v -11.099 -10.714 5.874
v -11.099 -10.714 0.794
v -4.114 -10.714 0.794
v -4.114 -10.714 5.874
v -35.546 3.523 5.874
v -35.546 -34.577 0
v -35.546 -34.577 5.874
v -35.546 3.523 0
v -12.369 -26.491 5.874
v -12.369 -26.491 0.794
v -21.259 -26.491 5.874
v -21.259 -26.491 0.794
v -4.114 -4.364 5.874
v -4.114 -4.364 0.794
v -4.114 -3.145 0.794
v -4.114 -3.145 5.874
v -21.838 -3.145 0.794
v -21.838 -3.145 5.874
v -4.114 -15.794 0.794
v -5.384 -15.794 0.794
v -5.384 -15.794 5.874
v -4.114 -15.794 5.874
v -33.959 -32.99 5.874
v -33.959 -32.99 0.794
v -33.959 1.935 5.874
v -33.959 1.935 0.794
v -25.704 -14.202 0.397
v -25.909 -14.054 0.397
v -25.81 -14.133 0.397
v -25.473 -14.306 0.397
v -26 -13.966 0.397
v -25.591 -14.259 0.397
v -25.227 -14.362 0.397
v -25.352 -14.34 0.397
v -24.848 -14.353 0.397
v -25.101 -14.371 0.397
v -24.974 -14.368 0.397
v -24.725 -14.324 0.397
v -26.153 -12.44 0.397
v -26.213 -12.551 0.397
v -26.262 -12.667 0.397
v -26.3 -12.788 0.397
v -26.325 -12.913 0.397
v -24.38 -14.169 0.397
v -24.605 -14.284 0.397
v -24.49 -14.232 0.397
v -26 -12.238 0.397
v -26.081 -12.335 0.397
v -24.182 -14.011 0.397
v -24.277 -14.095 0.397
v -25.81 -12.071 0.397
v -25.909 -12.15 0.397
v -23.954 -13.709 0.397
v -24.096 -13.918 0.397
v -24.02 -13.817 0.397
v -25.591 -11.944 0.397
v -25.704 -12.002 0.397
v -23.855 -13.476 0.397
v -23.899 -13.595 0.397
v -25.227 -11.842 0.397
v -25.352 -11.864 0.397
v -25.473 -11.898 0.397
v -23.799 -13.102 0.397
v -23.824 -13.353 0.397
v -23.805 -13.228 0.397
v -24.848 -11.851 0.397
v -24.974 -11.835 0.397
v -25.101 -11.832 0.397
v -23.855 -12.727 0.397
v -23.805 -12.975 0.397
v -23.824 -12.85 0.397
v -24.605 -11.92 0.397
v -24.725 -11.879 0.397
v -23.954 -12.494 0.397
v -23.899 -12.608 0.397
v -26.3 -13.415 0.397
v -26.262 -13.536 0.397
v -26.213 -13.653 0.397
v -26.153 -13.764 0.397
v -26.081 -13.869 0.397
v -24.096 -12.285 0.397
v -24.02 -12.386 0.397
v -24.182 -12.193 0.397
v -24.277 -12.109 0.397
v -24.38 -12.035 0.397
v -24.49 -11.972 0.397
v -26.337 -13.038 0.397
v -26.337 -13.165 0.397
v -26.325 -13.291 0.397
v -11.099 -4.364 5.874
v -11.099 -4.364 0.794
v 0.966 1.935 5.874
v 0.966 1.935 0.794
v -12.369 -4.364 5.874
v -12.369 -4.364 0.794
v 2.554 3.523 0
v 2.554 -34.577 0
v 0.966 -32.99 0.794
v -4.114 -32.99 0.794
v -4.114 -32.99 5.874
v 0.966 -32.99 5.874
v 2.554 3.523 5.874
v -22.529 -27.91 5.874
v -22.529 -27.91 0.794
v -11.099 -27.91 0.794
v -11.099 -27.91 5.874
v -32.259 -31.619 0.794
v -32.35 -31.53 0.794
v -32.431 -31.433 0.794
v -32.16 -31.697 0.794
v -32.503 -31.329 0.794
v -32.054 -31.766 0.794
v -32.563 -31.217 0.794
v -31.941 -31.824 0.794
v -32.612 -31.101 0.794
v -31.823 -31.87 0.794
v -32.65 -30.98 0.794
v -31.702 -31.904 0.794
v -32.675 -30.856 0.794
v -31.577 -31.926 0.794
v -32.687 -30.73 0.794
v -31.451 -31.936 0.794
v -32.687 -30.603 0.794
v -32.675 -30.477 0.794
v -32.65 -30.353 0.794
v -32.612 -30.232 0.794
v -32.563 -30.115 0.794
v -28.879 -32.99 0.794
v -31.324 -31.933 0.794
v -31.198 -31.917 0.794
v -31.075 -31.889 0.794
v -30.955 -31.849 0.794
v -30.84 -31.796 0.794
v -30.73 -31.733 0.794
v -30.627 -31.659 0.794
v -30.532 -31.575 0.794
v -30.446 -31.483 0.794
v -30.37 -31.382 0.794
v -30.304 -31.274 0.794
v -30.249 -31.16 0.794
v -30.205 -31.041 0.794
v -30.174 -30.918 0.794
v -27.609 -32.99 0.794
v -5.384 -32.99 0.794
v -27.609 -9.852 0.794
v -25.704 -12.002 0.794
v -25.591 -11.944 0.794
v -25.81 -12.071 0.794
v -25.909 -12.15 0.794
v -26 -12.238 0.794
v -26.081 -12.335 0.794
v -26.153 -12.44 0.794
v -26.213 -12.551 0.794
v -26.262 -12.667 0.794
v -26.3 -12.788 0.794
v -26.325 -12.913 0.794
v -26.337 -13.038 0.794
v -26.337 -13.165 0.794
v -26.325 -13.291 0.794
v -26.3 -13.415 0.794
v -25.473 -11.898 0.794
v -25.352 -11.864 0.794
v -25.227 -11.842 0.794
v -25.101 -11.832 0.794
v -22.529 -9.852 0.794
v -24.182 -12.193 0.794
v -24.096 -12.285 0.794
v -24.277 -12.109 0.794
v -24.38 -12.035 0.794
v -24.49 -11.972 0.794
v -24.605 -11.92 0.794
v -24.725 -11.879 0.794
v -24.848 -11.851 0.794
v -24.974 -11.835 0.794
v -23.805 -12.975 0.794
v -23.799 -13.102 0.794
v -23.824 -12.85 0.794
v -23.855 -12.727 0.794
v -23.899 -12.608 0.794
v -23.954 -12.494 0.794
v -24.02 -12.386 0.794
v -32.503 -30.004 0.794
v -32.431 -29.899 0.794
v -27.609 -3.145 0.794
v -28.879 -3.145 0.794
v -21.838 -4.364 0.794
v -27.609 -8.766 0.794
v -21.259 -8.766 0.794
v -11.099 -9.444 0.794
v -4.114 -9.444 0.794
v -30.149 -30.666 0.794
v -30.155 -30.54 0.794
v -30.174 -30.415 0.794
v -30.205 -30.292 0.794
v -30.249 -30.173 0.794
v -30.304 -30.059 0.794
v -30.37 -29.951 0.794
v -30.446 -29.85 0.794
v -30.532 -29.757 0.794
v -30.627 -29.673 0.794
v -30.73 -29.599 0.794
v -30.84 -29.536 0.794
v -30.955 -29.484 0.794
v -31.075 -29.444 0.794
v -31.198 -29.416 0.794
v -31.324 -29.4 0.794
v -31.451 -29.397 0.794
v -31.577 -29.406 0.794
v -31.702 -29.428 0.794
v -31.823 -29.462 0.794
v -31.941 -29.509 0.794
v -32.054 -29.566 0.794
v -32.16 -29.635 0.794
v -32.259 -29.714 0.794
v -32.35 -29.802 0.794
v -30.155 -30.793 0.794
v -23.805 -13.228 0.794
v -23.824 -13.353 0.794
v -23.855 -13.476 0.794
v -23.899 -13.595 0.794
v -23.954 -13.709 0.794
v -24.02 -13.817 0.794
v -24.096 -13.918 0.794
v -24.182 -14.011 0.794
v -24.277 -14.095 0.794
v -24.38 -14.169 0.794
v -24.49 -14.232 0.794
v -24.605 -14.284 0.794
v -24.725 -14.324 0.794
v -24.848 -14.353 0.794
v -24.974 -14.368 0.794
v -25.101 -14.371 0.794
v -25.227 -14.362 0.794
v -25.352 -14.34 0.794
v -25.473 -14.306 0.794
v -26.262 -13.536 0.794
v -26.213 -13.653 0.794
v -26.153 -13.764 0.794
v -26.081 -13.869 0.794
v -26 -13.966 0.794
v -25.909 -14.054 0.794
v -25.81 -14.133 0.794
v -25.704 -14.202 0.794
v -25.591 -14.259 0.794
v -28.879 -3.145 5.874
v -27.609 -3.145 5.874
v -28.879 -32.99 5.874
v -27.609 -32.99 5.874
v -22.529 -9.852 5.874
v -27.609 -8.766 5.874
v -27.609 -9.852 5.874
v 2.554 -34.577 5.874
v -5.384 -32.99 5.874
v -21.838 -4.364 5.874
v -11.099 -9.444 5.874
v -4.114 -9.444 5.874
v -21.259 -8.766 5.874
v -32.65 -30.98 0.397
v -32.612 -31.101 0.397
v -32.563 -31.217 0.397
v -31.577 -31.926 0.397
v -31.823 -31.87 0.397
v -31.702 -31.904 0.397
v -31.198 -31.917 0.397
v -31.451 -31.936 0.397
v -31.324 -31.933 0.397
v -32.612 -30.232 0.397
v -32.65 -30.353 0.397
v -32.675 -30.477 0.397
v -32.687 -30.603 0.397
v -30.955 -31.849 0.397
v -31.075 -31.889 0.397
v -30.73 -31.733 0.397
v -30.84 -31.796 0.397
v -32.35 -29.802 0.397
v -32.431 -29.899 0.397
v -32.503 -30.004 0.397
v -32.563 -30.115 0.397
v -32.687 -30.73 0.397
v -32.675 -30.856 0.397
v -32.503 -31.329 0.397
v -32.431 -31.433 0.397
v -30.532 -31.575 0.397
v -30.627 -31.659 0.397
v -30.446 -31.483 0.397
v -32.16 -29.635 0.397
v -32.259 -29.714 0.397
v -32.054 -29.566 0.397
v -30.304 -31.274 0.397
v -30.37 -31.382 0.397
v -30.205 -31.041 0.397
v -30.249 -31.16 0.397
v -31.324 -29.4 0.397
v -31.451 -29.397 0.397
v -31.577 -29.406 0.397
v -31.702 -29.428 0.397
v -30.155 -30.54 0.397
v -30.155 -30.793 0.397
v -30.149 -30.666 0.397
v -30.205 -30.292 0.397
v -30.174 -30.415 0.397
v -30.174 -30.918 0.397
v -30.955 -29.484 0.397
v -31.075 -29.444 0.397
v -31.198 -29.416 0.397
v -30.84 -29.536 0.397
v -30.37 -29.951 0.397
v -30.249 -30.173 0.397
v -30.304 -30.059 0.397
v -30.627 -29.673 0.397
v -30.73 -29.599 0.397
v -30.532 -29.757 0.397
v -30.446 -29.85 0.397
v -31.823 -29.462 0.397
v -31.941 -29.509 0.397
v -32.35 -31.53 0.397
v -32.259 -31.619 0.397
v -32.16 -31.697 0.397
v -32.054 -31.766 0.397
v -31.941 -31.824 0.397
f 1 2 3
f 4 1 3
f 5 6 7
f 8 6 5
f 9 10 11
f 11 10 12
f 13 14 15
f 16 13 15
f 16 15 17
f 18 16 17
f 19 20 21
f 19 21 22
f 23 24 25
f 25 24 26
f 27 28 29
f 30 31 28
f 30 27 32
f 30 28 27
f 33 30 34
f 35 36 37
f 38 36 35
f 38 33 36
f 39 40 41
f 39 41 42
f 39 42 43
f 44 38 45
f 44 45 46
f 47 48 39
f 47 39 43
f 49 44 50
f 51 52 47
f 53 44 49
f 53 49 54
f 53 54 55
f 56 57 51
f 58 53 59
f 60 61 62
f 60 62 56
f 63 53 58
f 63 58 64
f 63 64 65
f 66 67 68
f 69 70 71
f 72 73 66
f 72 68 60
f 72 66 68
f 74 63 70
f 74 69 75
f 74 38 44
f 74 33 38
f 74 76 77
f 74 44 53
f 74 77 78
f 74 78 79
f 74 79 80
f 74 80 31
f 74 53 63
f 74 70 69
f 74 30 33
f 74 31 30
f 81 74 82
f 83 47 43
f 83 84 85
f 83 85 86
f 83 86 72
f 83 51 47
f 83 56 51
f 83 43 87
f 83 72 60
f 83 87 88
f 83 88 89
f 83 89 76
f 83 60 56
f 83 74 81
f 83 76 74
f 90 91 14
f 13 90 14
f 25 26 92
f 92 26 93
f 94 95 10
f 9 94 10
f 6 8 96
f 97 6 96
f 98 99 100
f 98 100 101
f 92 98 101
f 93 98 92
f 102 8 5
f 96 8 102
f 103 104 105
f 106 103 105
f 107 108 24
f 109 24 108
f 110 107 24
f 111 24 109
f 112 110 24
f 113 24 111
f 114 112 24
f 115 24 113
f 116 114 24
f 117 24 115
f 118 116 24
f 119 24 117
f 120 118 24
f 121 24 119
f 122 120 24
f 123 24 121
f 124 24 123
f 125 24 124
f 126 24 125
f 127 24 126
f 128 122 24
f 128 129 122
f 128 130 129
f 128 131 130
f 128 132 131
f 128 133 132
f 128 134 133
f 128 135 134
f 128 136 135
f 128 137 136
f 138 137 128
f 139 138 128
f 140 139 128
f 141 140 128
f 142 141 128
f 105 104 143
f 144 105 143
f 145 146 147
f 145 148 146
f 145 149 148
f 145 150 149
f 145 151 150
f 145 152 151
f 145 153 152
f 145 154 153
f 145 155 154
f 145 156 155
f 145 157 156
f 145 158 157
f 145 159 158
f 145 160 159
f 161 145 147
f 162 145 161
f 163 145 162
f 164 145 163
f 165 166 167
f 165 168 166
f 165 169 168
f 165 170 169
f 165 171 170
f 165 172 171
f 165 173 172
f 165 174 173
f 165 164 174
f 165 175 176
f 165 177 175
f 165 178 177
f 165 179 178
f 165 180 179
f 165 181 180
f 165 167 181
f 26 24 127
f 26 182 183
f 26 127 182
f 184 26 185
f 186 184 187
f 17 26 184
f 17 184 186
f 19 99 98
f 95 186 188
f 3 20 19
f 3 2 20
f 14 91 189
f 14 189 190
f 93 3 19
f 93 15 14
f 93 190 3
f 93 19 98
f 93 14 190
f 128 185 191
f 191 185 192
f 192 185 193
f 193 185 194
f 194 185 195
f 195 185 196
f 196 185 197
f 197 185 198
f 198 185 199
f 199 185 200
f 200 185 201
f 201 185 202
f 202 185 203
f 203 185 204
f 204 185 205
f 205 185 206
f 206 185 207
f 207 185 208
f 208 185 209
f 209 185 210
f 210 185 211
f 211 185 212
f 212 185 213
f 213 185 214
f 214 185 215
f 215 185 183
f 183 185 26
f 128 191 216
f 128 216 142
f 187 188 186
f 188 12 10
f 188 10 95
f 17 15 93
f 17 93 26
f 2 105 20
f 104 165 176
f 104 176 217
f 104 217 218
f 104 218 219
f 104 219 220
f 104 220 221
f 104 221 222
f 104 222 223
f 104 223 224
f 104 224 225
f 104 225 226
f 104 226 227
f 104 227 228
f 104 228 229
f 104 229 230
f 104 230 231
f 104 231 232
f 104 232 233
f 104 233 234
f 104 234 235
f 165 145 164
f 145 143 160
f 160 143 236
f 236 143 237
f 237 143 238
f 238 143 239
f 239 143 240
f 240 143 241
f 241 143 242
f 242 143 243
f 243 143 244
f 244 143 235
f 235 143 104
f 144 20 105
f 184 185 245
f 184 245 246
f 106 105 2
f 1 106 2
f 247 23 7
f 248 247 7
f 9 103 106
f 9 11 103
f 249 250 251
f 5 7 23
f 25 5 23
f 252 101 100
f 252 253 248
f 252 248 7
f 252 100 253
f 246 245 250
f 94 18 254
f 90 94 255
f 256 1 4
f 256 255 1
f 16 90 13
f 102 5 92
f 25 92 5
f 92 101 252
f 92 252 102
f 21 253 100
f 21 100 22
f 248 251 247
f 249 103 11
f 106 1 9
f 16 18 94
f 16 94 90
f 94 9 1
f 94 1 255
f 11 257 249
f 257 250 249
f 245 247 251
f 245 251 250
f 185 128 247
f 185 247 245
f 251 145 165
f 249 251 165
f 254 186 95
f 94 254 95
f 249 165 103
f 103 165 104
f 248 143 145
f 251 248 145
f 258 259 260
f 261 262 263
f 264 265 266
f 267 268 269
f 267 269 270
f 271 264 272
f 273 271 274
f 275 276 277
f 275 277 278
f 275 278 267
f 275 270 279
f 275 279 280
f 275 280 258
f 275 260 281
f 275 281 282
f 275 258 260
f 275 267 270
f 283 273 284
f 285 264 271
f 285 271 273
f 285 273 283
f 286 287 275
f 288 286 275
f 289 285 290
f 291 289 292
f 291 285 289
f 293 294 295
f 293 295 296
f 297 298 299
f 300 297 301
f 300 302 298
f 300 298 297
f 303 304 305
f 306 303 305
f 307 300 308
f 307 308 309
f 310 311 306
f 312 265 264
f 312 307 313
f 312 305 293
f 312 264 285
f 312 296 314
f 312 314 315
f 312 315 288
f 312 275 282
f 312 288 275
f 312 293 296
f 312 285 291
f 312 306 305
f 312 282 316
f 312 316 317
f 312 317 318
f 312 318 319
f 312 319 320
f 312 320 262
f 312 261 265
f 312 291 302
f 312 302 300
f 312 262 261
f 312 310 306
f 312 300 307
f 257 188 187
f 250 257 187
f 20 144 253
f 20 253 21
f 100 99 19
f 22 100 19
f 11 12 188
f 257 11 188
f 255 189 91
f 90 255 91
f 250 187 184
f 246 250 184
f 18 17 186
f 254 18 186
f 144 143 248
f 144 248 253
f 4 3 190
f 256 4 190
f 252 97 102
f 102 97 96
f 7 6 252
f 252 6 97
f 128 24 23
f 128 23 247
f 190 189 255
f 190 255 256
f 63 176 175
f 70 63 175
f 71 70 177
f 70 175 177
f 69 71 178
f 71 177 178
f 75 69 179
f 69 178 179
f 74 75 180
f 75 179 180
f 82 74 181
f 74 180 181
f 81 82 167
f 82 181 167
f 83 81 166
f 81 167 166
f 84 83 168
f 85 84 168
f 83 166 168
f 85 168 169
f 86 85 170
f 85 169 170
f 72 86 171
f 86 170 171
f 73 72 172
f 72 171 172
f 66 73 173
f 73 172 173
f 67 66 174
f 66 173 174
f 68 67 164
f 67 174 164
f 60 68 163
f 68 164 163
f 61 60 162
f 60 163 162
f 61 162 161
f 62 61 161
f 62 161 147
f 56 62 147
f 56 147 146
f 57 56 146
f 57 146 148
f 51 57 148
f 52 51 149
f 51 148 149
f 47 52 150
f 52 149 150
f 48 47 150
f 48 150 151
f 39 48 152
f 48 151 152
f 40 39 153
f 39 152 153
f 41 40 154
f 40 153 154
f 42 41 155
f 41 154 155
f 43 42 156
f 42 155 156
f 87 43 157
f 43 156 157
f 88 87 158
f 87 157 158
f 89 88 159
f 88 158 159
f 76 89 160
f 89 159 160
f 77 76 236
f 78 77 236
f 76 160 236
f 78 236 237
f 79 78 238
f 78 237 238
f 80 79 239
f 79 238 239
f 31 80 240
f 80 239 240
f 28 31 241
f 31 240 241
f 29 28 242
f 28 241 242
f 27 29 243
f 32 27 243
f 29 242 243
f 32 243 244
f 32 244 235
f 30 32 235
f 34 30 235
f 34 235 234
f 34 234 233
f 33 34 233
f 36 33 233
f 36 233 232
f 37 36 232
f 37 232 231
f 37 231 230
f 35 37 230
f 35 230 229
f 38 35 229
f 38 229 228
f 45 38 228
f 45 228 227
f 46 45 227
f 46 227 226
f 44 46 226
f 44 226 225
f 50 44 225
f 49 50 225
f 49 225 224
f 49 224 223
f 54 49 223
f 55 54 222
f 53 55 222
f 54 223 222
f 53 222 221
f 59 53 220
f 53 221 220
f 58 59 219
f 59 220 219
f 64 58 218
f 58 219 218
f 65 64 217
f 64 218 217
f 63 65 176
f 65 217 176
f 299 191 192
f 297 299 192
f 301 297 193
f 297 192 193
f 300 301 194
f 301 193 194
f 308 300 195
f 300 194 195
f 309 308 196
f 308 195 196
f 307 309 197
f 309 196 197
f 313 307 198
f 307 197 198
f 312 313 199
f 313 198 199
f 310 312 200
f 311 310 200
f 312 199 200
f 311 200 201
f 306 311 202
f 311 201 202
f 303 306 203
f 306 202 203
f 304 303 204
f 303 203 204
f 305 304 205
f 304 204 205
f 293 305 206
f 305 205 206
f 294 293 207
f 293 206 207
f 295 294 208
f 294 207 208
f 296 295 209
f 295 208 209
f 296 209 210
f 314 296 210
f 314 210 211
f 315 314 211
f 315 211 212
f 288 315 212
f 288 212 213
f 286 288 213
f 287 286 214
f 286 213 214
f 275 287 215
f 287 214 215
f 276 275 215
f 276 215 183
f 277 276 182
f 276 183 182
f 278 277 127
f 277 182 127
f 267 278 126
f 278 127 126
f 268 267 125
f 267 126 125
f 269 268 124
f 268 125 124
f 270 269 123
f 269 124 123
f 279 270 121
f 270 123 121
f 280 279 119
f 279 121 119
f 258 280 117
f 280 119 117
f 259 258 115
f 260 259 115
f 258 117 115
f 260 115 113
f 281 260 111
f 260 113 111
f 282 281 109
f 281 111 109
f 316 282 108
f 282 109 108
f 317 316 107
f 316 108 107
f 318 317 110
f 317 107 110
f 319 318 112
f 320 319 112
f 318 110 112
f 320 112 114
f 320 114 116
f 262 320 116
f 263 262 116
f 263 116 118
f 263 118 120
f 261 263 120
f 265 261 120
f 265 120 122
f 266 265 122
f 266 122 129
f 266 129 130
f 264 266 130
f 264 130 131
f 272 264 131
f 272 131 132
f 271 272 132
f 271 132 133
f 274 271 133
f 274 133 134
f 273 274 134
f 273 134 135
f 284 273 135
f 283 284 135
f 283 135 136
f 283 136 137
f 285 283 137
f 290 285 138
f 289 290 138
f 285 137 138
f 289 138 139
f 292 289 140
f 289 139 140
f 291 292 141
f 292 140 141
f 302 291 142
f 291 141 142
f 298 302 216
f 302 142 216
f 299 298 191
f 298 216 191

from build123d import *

# Parameters (mm, degrees)
F0_W      = 38.1
F0_H      = 38.1
F1_DEPTH  = 0.79375
F2_W      = 38.1
F2_H      = 38.1
F2_W_2    = 34.925
F2_H_2    = 34.925
F3_DEPTH  = 5.08
F4_W      = 1.27
F4_H      = 29.845
F5_DEPTH  = 5.08
F6_R      = 1.27
F7_DEPTH  = 0.396875
F9_DEPTH  = 5.08
F8_W      = 1.27
F8_H      = 17.1959060269
F10_DEPTH = 5.08
F8_R      = 1.27
F11_DEPTH = 0.396875
F8_W_2    = 6.985
F8_H_2    = 1.27
F12_DEPTH = 5.08


# Not quite as in the source:
# - a feature names something its author has since deleted; it is built from what else it names


with BuildPart() as f1:
    # F0 (on Top) → F1 (new body)
    with BuildSketch(Plane.XY):
        with Locations((-16.4964904517, -15.5271535208)):
            Rectangle(F0_W, F0_H)
    extrude(amount=F1_DEPTH)

    # F2 (on face) → F3 (join)
    with BuildSketch(Plane.XY.offset(0.79375)):
        with Locations((-16.4964904517, -15.5271535208)):
            Rectangle(F2_W, F2_H)
        with Locations((-16.4964904517, -15.5271535208)):
            Rectangle(F2_W_2, F2_H_2, mode=Mode.SUBTRACT)
    extrude(amount=F3_DEPTH)

    # F4 (on face) → F5 (join)
    with BuildSketch(Plane.XY.offset(0.79375)):
        with Locations((-28.2439904517, -18.0671535208)):
            Rectangle(F4_W, F4_H)
    extrude(amount=F5_DEPTH)

    # F6 (on face) → F7 (cut)
    with BuildSketch(Plane.XY.offset(0.79375)):
        with Locations((-31.4189904517, -30.6663066149)):
            Circle(F6_R)
    extrude(amount=-F7_DEPTH, mode=Mode.SUBTRACT)

    # F8 (on face) → F9 (join)
    with BuildSketch(Plane.XY.offset(0.79375)):
        Polygon((-4.1139904517, -3.1446535208), (-21.8377289305, -3.1446535208), (-21.8377289305, -4.3637474939), (-12.3689904517, -4.3637474939), (-12.3689904517, -26.4913998544), (-21.2589904517, -26.4913998544), (-21.2589904517, -8.7657477707), (-22.5289904517, -8.7657477707), (-27.6089904517, -8.7657477707), (-27.6089904517, -9.8523776978), (-22.5289904517, -9.8523776978), (-22.5289904517, -27.9096535208), (-11.0989904517, -27.9096535208), (-11.0989904517, -10.7137474939), (-11.0989904517, -9.4437474939), (-11.0989904517, -4.3637474939), (-4.1139904517, -4.3637474939), align=None)
    extrude(amount=F9_DEPTH)

    # F8 (on face) → F10 (join)
    with BuildSketch(Plane.XY.offset(0.79375)):
        with Locations((-4.7489904517, -24.3917005073)):
            Rectangle(F8_W, F8_H)
    extrude(amount=F10_DEPTH)

    # F8 (on face) → F11 (cut)
    with BuildSketch(Plane.XY.offset(0.79375)):
        with Locations((-25.0689904517, -13.1018003449)):
            Circle(F8_R)
    extrude(amount=-F11_DEPTH, mode=Mode.SUBTRACT)

    # F8 (on face) → F12 (join)
    with BuildSketch(Plane.XY.offset(0.79375)):
        with Locations((-7.6064904517, -10.0787474939)):
            Rectangle(F8_W_2, F8_H_2)
    extrude(amount=F12_DEPTH)


solid = f1.part
